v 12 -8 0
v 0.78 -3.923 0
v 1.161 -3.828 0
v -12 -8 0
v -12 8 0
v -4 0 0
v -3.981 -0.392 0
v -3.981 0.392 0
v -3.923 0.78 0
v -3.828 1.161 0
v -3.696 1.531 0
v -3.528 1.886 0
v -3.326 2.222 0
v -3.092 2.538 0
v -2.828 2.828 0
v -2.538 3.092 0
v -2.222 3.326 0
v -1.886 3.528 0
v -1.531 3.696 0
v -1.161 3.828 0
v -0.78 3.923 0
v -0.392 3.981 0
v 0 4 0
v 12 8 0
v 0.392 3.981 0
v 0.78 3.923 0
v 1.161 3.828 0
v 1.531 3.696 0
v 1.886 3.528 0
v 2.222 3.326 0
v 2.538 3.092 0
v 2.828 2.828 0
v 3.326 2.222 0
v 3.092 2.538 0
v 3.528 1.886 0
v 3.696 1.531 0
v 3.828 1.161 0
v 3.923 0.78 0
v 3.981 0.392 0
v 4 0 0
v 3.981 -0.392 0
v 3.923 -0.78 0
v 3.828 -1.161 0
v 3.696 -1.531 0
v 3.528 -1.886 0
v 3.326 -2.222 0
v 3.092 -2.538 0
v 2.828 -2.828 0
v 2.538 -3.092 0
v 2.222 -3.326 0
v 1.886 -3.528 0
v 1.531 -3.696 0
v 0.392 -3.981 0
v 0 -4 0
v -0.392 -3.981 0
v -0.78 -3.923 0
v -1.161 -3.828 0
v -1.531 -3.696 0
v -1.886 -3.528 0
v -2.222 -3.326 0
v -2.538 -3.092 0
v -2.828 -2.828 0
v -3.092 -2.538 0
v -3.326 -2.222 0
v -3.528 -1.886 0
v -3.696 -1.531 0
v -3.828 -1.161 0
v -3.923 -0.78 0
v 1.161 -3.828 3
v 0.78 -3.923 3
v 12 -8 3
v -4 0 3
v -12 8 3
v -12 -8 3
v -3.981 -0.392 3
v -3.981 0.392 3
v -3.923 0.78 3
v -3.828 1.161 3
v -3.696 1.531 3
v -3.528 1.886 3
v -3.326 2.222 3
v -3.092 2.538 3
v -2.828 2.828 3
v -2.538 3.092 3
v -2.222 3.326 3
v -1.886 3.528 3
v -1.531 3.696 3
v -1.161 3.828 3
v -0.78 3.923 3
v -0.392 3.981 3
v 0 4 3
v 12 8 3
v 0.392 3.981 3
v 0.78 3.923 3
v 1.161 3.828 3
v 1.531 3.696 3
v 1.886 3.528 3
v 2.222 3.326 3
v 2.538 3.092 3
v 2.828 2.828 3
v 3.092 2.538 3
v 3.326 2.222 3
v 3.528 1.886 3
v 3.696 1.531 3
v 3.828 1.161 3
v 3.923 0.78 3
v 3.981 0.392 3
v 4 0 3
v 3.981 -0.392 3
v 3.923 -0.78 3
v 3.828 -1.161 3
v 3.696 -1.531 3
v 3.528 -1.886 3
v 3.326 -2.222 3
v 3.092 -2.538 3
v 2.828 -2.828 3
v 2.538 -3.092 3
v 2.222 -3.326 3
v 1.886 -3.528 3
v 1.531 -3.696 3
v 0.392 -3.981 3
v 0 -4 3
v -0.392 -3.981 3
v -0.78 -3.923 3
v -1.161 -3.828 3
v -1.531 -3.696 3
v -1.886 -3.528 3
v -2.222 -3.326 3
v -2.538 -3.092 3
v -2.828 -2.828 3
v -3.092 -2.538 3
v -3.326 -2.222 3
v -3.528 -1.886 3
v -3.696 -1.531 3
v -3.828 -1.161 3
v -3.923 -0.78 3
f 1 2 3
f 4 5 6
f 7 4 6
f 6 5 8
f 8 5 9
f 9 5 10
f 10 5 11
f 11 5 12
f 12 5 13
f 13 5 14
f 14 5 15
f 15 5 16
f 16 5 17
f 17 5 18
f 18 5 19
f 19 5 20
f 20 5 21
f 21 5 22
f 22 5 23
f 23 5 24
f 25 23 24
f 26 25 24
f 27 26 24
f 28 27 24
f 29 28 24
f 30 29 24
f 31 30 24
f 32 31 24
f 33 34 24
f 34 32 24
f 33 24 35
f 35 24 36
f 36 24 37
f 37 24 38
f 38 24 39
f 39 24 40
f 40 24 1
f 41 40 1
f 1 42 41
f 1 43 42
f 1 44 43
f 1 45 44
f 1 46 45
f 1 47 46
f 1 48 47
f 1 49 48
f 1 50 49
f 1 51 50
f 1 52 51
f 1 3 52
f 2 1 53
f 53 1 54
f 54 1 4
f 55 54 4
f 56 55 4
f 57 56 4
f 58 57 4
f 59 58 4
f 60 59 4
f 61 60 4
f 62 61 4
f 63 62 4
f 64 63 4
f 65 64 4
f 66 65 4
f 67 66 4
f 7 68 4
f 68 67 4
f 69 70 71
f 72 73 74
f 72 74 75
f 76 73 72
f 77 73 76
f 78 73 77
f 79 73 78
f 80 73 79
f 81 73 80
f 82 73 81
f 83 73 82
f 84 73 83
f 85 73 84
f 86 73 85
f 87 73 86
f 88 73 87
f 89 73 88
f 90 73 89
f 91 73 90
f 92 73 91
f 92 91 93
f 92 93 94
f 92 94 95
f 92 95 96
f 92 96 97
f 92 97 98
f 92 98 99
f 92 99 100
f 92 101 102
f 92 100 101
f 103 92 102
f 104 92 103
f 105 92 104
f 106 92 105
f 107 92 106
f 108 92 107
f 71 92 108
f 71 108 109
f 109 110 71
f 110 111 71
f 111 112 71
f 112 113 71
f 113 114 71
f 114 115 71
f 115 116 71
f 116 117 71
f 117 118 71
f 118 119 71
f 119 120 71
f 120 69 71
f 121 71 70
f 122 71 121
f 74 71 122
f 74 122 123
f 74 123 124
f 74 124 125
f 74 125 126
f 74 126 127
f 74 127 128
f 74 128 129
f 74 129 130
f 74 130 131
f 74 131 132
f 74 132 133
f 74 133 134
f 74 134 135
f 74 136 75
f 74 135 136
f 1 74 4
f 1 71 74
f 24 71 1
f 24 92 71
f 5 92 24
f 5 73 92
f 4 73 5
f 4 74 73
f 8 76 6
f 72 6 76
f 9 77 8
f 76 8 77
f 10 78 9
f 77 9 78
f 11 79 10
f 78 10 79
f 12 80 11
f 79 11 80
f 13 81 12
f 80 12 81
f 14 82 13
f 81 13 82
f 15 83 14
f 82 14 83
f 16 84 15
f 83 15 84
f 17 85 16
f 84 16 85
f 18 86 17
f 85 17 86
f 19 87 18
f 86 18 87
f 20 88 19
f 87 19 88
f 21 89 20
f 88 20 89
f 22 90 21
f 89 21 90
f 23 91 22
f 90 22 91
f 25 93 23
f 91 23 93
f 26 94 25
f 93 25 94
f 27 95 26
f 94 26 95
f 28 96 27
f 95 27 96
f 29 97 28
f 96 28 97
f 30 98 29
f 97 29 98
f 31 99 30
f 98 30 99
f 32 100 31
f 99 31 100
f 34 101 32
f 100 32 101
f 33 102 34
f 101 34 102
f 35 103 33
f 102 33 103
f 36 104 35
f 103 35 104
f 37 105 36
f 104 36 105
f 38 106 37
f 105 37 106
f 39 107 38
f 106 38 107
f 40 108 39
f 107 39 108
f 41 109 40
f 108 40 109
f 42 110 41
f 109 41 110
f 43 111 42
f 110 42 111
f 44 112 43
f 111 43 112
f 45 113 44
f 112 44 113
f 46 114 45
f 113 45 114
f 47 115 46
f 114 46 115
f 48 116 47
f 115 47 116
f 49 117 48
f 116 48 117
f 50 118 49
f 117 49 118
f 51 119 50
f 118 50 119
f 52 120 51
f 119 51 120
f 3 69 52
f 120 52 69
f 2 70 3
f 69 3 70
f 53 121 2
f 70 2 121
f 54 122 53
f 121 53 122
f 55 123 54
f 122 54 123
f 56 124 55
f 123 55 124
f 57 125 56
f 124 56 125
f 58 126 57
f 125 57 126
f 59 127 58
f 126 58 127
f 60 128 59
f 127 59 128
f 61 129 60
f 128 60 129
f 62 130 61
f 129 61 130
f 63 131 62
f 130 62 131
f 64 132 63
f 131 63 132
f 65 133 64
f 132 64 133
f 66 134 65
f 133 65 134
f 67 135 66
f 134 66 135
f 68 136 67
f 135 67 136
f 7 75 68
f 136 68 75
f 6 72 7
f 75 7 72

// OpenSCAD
// projection(cut = true): the slice at z = 0, re-extruded
linear_extrude(3) projection(cut = true) translate([0, 0, -5]) difference() {
    cube([24, 16, 10], center = true);
    cylinder(r = 4, h = 40, center = true, $fn = 64);
}
